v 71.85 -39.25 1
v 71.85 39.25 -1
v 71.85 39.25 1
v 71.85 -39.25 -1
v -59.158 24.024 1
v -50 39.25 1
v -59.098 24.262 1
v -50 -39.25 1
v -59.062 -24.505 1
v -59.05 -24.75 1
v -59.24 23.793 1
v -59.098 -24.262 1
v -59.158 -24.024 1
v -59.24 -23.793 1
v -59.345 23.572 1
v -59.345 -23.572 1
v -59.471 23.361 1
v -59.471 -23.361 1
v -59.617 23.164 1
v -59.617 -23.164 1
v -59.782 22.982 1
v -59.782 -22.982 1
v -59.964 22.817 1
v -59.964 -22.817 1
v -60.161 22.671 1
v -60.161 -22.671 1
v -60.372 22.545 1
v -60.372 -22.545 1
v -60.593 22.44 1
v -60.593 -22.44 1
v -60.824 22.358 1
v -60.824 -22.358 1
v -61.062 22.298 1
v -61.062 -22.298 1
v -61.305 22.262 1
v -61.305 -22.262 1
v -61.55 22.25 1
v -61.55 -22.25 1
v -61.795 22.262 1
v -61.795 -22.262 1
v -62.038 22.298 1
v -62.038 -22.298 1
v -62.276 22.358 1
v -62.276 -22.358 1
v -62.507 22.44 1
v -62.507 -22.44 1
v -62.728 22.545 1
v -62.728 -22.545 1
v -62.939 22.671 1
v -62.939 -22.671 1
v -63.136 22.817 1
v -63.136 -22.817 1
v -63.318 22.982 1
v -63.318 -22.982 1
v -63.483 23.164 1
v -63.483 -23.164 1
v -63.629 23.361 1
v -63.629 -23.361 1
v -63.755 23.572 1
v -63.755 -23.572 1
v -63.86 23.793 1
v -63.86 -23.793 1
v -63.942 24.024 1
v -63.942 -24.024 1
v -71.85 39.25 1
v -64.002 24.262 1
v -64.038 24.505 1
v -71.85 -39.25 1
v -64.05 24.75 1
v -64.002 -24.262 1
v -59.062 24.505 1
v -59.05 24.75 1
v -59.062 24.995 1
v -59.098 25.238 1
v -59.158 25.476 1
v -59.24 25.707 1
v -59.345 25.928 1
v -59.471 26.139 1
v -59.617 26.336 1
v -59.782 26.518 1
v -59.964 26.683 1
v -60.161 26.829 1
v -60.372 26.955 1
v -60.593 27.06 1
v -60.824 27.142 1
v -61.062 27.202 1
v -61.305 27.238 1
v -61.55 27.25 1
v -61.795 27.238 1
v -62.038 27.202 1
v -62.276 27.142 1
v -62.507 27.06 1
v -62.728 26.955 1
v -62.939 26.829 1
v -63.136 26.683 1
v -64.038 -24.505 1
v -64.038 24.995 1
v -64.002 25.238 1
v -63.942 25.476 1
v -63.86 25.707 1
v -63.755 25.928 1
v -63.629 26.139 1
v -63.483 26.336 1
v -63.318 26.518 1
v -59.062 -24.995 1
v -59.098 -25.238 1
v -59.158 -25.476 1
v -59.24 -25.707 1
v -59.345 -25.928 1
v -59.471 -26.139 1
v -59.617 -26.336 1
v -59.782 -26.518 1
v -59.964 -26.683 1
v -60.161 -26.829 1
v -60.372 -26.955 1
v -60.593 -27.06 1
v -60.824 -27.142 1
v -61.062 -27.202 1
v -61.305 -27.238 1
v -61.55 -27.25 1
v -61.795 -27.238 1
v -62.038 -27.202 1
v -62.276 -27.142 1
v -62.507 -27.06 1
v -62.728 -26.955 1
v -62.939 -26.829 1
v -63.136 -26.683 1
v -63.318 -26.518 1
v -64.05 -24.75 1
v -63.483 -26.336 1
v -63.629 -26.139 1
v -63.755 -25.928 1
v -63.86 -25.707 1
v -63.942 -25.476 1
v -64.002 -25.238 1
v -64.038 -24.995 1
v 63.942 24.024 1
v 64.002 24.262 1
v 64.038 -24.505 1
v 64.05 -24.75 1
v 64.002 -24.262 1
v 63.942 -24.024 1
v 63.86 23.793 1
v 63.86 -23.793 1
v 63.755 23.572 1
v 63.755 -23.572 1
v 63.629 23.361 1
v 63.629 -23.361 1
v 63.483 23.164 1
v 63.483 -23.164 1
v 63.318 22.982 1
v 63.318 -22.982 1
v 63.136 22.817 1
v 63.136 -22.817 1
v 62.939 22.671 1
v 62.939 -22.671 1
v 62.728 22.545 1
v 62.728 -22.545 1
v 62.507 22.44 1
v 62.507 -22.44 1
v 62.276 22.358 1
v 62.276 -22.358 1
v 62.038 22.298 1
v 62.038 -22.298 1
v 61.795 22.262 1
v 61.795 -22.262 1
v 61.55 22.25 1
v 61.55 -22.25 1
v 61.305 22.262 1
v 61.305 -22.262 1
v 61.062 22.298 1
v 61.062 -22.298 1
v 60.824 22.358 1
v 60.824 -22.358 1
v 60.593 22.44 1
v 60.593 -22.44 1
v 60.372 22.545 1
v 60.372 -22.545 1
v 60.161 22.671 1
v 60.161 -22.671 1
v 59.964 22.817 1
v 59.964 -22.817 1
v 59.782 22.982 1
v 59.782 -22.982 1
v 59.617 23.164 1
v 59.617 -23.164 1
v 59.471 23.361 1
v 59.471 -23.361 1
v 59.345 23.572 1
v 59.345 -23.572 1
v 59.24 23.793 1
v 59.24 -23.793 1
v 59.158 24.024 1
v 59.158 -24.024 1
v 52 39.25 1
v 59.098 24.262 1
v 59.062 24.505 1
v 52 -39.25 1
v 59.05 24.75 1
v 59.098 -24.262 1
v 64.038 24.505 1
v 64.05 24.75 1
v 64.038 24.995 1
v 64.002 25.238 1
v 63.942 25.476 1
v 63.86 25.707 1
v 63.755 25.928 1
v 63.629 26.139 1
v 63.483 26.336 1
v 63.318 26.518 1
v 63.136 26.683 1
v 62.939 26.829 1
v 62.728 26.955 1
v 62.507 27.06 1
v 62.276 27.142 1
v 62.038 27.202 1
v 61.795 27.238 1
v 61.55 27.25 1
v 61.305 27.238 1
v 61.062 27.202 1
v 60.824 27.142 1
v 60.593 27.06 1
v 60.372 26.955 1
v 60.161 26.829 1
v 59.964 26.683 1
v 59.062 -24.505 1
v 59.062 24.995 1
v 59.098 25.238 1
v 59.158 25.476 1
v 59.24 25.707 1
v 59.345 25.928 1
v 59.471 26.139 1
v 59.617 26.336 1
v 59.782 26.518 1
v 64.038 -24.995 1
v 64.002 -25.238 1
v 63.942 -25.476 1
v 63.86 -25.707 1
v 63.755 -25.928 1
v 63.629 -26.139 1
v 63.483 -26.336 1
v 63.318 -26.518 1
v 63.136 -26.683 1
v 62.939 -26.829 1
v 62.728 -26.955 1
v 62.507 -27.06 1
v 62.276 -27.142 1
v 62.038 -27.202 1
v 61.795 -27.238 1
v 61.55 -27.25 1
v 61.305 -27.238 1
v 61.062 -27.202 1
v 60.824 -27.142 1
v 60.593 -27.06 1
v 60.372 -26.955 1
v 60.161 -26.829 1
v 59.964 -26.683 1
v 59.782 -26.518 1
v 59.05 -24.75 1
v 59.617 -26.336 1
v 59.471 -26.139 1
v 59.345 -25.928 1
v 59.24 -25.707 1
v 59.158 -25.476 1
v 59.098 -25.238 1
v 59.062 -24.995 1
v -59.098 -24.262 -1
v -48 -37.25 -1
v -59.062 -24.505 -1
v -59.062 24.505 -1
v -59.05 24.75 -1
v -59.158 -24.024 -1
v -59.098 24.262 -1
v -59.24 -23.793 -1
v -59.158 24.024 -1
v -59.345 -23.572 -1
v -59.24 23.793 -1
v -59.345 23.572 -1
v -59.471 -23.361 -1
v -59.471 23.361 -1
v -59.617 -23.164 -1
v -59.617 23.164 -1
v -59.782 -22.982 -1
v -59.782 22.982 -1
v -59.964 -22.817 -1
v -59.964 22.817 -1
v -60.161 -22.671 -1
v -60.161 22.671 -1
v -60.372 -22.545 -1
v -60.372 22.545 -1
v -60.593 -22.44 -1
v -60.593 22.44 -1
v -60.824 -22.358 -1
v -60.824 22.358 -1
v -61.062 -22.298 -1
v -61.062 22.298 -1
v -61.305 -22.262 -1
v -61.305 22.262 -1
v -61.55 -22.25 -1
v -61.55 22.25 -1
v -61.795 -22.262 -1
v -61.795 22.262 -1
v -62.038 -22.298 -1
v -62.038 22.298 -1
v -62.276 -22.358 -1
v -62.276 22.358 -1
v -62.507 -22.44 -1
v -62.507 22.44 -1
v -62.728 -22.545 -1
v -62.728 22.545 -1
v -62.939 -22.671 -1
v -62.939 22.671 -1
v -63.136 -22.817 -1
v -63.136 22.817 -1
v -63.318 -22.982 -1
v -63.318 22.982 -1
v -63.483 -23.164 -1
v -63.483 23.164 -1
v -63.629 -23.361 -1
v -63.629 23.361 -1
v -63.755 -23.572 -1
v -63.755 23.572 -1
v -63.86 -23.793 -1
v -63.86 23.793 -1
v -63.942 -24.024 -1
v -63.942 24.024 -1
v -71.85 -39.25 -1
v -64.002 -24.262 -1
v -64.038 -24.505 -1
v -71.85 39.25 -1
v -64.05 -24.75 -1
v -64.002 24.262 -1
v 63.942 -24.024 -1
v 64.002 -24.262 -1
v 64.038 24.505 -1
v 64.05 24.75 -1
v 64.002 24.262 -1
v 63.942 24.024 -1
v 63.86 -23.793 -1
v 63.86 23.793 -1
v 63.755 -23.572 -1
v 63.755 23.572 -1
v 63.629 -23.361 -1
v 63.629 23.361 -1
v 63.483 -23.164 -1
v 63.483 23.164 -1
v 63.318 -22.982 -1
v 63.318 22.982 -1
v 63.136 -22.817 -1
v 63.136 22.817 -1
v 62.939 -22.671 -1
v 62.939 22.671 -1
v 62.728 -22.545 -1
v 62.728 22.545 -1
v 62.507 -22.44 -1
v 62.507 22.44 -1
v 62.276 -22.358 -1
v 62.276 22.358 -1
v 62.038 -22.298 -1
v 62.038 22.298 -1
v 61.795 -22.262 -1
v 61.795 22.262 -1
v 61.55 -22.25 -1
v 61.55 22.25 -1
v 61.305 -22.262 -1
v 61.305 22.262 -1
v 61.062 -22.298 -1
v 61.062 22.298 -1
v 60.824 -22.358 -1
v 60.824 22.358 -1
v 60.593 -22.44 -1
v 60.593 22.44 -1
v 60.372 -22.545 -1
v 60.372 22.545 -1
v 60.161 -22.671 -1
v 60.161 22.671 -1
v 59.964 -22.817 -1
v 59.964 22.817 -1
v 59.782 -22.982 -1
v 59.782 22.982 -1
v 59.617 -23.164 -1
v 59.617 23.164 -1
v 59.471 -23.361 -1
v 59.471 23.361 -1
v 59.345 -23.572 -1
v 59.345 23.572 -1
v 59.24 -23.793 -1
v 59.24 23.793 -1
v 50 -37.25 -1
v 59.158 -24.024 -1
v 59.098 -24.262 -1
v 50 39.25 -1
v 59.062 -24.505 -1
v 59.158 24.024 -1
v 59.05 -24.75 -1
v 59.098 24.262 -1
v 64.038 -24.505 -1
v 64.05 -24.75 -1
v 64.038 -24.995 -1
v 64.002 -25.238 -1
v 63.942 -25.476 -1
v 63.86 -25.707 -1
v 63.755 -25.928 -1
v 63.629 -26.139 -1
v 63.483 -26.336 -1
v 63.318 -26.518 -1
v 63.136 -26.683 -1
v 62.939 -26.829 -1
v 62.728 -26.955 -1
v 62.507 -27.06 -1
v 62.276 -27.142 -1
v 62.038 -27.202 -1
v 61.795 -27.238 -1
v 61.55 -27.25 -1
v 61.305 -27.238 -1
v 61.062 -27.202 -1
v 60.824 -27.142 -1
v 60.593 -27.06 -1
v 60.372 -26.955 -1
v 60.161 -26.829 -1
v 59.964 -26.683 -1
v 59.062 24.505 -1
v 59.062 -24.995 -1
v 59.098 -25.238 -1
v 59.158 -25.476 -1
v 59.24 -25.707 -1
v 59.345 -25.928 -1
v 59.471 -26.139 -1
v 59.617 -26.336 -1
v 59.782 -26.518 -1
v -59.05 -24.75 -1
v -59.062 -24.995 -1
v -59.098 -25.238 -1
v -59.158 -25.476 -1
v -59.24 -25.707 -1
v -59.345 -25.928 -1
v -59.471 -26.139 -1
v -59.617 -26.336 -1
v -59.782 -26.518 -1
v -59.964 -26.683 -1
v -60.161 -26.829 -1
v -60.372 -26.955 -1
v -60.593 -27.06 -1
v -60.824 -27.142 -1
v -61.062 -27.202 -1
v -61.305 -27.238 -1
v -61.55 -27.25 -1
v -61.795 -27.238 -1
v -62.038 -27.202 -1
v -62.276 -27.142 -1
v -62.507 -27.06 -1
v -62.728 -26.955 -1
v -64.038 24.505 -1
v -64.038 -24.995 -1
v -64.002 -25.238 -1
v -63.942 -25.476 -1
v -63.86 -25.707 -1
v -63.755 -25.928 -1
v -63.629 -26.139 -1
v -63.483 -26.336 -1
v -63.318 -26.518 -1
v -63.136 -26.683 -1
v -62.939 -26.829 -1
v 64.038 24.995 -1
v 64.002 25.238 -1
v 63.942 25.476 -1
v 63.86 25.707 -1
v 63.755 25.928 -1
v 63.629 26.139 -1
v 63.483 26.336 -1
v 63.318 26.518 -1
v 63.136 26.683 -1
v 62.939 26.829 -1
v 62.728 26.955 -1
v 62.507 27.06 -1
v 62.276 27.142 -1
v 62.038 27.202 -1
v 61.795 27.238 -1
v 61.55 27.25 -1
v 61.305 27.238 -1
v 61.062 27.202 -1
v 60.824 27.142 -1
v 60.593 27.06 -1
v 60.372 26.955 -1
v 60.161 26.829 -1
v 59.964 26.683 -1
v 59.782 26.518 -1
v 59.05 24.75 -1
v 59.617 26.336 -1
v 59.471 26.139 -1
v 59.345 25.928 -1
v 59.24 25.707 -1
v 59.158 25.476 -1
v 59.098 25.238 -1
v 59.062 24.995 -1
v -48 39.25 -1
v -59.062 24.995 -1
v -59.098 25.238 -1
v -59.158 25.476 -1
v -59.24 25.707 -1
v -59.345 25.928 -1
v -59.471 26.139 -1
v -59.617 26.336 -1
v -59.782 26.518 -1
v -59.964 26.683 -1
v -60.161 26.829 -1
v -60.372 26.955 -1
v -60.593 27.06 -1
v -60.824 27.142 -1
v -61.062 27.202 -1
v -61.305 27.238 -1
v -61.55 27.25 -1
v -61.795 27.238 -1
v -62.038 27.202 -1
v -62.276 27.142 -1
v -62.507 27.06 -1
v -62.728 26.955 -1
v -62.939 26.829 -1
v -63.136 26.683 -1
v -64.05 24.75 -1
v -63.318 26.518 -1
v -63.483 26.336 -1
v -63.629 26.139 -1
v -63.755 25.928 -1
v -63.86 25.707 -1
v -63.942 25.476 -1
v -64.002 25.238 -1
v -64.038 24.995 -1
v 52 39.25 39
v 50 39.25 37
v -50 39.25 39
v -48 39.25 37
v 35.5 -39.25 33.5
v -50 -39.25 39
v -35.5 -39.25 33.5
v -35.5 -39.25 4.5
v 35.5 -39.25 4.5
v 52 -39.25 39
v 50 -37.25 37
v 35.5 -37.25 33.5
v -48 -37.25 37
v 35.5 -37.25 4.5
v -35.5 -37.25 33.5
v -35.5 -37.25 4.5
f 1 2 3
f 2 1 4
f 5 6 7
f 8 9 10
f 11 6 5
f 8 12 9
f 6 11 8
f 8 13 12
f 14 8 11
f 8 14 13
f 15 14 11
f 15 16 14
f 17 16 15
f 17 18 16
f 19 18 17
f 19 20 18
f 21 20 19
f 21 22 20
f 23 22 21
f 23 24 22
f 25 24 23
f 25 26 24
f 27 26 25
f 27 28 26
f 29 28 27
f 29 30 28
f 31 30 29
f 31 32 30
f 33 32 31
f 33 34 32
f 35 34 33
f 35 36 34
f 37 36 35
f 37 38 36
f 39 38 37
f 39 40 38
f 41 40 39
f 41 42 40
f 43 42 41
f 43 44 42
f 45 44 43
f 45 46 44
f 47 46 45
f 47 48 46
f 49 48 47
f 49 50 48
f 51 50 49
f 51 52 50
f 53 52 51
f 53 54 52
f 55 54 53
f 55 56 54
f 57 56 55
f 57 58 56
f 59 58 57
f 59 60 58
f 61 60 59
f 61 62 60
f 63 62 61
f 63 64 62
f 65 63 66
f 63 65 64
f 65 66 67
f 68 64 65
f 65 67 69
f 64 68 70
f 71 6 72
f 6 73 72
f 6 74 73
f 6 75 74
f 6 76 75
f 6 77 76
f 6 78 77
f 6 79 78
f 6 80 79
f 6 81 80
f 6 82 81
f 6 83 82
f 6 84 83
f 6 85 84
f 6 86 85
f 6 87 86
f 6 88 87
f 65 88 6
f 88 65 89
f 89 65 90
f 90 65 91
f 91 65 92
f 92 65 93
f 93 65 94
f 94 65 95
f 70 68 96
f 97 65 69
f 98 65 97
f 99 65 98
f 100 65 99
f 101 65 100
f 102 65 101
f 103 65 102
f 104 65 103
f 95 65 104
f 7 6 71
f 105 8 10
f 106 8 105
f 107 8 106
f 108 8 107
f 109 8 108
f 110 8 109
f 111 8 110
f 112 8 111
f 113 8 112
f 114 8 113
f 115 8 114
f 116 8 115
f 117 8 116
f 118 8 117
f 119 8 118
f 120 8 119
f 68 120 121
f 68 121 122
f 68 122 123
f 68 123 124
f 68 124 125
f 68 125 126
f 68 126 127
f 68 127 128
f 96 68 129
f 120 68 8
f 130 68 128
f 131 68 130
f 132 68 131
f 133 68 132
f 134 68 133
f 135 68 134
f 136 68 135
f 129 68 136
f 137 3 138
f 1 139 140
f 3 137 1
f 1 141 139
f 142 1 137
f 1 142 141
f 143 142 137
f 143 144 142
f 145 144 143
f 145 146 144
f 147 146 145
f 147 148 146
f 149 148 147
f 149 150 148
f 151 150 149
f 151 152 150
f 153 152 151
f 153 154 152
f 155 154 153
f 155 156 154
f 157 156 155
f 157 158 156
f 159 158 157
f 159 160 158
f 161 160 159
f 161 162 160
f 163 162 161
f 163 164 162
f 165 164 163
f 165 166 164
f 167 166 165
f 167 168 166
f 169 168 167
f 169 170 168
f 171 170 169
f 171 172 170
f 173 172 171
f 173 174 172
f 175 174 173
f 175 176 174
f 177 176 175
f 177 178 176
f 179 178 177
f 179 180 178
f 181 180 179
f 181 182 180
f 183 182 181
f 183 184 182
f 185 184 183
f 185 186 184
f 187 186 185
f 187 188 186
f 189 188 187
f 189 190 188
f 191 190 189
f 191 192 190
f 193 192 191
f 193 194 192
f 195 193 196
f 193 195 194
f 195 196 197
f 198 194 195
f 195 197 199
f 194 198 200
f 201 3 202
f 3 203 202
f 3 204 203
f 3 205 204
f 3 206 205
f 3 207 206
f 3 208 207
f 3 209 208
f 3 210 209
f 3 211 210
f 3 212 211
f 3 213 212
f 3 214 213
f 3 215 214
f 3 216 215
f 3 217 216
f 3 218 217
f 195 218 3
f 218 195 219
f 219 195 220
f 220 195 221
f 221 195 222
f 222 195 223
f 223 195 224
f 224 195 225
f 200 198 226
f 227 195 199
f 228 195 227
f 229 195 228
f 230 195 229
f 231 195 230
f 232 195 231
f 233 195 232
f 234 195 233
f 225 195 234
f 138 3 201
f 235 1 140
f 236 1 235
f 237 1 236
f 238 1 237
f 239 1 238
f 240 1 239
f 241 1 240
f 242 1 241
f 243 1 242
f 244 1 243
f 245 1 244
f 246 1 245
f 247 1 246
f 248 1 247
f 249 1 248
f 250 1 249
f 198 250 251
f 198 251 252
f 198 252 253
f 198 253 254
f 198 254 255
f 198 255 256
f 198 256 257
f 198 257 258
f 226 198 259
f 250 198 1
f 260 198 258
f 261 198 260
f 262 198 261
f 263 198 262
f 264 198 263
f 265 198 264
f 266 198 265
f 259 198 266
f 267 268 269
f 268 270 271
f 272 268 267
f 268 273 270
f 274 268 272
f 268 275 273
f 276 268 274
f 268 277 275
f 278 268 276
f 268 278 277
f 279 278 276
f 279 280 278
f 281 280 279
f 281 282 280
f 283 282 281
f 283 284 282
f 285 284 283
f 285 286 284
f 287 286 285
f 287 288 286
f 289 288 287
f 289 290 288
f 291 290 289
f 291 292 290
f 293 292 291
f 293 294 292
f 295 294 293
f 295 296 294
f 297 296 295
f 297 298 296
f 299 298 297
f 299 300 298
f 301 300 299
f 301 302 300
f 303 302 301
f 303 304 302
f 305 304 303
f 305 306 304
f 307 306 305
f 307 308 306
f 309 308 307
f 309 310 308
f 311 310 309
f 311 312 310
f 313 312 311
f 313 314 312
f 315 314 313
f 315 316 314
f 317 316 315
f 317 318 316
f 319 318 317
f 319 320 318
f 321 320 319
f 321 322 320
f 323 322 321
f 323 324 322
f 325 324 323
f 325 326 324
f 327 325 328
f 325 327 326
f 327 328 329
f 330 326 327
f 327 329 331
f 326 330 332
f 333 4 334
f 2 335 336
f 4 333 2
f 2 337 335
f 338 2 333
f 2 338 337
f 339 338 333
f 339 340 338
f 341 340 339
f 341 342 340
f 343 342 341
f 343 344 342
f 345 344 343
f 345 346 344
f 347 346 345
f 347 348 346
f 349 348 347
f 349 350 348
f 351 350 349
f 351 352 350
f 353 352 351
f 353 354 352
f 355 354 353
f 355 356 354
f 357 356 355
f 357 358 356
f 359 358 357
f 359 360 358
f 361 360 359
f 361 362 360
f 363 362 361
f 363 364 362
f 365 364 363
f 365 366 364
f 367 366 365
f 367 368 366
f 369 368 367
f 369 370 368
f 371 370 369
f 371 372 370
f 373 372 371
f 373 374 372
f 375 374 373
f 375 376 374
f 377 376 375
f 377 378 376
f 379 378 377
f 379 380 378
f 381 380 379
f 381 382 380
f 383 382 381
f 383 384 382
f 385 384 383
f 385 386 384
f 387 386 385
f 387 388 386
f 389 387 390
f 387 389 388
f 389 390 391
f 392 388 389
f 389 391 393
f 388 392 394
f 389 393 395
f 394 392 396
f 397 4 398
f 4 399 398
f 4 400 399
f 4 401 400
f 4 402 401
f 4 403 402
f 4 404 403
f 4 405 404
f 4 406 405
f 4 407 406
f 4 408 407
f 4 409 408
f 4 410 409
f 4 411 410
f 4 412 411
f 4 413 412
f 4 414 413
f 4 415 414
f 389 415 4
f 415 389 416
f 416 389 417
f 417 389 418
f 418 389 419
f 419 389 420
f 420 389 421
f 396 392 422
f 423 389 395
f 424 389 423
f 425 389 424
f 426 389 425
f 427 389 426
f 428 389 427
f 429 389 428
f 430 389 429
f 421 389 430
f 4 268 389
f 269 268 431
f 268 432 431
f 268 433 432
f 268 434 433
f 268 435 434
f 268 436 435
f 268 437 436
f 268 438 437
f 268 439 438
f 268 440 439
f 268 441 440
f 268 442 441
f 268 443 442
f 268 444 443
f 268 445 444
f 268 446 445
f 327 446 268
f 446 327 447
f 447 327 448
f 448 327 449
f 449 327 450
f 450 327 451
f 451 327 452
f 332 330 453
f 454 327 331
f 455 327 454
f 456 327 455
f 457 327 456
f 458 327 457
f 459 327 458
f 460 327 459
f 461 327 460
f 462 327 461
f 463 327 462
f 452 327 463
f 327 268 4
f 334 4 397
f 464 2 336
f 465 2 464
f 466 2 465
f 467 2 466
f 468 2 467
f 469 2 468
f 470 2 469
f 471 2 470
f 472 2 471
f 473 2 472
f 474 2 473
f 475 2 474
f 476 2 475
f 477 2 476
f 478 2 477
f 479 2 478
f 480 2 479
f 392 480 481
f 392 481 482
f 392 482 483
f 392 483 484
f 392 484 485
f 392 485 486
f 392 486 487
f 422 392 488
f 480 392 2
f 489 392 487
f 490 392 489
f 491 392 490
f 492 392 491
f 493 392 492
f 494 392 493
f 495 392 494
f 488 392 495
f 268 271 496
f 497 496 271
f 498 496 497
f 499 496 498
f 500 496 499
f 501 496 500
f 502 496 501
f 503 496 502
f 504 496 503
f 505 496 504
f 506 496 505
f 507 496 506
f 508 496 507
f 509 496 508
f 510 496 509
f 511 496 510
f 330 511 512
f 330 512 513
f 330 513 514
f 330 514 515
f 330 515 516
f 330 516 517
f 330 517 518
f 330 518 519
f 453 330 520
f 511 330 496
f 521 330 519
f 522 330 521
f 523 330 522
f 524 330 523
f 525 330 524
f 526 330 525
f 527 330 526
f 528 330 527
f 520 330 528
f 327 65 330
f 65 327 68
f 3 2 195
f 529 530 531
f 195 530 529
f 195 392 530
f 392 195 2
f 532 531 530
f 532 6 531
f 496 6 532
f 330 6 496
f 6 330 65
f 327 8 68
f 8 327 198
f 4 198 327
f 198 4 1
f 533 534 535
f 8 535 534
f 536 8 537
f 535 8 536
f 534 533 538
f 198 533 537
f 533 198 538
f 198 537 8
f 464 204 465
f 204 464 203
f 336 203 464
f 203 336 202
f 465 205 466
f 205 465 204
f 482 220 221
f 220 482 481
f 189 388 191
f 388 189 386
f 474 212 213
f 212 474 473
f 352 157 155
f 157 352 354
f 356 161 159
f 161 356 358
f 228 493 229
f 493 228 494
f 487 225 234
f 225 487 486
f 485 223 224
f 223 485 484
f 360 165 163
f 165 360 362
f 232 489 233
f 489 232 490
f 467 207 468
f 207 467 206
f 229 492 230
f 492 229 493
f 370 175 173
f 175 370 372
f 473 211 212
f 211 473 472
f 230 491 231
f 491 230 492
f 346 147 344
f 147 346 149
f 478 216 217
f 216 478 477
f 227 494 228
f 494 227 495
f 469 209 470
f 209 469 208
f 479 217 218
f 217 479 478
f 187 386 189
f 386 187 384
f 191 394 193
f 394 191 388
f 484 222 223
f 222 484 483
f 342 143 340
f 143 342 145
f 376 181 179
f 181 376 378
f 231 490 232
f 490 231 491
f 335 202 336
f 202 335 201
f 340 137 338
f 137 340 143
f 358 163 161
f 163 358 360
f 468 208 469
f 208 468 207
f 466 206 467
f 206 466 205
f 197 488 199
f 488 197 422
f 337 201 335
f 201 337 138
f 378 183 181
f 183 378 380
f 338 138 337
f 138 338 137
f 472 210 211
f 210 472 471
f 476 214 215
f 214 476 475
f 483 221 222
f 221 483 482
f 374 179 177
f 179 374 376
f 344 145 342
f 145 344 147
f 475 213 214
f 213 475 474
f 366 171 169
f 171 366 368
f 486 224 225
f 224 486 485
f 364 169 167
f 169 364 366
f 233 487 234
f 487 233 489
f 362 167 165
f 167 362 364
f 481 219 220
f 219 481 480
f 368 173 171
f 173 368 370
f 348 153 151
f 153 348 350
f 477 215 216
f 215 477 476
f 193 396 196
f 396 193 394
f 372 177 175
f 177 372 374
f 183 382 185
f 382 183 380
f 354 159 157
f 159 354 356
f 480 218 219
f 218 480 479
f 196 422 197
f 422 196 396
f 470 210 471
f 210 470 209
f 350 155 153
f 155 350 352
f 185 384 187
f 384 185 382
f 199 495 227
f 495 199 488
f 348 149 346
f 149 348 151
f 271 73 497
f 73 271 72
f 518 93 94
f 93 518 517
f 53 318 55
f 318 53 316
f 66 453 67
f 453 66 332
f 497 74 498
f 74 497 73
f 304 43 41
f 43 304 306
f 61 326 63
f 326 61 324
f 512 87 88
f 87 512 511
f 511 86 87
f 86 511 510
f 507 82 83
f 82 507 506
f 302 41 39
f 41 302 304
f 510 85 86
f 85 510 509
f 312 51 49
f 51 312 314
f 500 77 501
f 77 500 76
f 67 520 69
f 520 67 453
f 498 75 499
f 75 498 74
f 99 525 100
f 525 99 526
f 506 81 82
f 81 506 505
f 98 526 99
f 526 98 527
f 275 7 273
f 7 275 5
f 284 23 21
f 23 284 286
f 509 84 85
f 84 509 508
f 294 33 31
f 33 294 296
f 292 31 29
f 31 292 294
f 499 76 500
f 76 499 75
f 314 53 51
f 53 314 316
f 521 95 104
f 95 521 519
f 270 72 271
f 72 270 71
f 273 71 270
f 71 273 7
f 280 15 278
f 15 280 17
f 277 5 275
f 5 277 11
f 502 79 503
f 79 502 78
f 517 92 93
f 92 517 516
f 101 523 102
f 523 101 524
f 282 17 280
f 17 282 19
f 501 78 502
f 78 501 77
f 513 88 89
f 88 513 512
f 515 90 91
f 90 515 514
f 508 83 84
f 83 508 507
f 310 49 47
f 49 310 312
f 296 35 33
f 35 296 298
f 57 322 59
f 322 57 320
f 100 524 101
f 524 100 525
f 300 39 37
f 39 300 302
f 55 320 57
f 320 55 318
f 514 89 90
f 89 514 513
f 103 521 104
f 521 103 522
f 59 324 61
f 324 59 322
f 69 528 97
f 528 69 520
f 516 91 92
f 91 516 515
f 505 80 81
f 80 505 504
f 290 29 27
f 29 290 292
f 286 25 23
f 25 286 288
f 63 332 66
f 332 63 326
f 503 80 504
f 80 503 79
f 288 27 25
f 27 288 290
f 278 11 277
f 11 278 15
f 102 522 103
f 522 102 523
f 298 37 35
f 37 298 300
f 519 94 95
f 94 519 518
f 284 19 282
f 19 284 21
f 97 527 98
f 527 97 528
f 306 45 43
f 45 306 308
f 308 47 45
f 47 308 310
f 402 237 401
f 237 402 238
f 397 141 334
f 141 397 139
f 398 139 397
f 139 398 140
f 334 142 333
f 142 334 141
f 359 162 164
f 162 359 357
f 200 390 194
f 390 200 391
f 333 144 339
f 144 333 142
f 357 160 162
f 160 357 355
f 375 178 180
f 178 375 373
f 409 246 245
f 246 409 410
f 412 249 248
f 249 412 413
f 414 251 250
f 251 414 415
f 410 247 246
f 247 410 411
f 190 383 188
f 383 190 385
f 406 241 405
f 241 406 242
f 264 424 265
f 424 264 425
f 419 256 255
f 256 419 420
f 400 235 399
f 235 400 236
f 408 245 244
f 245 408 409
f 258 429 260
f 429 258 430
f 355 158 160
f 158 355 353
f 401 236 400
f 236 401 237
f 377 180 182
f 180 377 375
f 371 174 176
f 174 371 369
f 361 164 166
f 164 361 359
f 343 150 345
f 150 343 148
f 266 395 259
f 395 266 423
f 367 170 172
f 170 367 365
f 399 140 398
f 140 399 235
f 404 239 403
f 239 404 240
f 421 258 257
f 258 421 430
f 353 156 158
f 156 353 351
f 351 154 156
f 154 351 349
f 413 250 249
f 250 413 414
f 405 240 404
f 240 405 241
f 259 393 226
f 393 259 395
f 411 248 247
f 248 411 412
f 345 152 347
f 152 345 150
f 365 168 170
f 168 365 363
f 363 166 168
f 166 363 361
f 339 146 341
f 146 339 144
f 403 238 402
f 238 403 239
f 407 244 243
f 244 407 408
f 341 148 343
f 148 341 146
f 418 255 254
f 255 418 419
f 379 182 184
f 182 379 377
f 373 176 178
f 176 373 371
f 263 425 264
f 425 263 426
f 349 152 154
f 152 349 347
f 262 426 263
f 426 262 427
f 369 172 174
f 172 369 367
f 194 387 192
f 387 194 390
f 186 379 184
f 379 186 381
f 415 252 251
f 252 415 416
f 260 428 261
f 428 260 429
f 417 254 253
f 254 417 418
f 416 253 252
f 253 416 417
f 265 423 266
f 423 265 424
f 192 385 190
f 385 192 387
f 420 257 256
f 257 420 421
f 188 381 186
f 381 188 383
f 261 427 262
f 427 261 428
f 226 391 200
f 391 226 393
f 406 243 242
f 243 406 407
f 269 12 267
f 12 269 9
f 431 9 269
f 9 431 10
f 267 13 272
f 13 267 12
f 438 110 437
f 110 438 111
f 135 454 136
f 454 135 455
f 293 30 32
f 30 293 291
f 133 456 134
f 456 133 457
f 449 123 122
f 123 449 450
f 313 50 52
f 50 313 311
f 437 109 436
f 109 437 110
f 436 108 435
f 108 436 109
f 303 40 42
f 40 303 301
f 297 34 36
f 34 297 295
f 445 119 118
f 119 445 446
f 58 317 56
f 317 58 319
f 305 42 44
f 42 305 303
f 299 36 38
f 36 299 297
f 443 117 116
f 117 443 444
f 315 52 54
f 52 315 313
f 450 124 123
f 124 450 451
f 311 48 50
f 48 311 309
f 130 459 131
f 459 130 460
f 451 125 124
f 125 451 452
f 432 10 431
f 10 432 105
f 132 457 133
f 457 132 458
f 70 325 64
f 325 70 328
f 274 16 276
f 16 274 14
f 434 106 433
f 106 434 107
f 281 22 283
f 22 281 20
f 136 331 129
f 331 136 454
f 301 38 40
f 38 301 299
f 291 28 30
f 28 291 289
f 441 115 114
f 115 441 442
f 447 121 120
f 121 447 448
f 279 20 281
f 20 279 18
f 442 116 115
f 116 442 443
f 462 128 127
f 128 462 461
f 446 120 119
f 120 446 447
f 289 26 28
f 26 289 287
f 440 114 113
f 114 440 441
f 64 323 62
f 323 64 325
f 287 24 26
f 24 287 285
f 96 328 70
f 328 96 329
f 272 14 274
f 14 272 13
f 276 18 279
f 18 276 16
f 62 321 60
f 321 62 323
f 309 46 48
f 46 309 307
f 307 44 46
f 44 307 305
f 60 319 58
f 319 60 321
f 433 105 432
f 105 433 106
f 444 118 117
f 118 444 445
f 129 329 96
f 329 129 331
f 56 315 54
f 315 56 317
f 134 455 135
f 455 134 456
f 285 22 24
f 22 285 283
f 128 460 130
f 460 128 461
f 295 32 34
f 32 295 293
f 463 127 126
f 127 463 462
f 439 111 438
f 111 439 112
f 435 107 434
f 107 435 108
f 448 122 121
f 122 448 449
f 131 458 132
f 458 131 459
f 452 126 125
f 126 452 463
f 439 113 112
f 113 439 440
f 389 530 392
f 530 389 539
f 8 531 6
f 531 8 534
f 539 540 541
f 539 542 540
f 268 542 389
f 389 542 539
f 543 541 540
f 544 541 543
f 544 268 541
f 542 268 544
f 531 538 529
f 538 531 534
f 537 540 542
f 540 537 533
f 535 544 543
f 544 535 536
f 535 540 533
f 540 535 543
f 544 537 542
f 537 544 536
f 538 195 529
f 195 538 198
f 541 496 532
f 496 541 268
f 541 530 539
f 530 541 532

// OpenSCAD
// file: mountplate.scad
//Make this as functions so accessable outside of file
function mountplate_depth()=78.5;
function mountplate_width()=143.7;
function mountplate_thickness()=2;


module mountplate()
{
    hole_diameter=5;
    hole_frontback=12+hole_diameter/2;
    hole_side=7.8+hole_diameter/2;
    
    
    thickness=mountplate_thickness();
    width=mountplate_width();
    depth=mountplate_depth();
    
    hole_x=width/2-hole_side;
    hole_y=depth/2-hole_frontback;
    
    echo("Hole distance X",hole_x*2);
    
    difference()
    {
        cube([width,depth,thickness],center=true);
        translate([hole_x,hole_y,0])cylinder(d=hole_diameter,h=thickness,center=true,$fn=64);
        translate([-hole_x,hole_y,0])cylinder(d=hole_diameter,h=thickness,center=true,$fn=64);
        translate([hole_x,-hole_y,0])cylinder(d=hole_diameter,h=thickness,center=true,$fn=64);
        translate([-hole_x,-hole_y,0])cylinder(d=hole_diameter,h=thickness,center=true,$fn=64);
        
        //cube([110,60,2],center=true);
    }
    
    
    
}

mountplate();
// file: frontplate.scad
//Make this as functions so accessable outside of file
function frontplate_thickness()=2;



module frontplate(height=40,width=80)
{
    minheight=34;
    minwidth=75;
    thickness=frontplate_thickness();
    
    cutout_height=29;
    cutout_width=71;
    
    height=max(minheight,height);
    width=max(minwidth,width);
    
    echo("Frontplate Height:",height);
    echo("Frontplate Width:",width);
    
    difference()
    {
        cube([width,height,thickness],center=true);
        cube([cutout_width,cutout_height,thickness],center=true);
    }
}


frontplate();
// main file
use <frontplate.scad>
use <mountplate.scad>

box_width=100;
box_height=40;
box_depth=mountplate_depth();
box_thickness=2;


difference()
{
    mountplate();
    cube([box_width,box_depth, 100],center=true);
}
translate([0,-mountplate_depth()/2+frontplate_thickness()/2,box_height/2-mountplate_thickness()/2])
    rotate([90,0,0])frontplate(box_height,box_width);

//side walls
translate([box_width/2,-box_depth/2,-mountplate_thickness()/2])
    cube([box_thickness,box_depth,box_height]);
translate([-box_width/2,-box_depth/2,-mountplate_thickness()/2])
    cube([box_thickness,box_depth,box_height]);

translate([0,0,box_height-box_thickness]) cube([box_width,box_depth,box_thickness],center=true);
